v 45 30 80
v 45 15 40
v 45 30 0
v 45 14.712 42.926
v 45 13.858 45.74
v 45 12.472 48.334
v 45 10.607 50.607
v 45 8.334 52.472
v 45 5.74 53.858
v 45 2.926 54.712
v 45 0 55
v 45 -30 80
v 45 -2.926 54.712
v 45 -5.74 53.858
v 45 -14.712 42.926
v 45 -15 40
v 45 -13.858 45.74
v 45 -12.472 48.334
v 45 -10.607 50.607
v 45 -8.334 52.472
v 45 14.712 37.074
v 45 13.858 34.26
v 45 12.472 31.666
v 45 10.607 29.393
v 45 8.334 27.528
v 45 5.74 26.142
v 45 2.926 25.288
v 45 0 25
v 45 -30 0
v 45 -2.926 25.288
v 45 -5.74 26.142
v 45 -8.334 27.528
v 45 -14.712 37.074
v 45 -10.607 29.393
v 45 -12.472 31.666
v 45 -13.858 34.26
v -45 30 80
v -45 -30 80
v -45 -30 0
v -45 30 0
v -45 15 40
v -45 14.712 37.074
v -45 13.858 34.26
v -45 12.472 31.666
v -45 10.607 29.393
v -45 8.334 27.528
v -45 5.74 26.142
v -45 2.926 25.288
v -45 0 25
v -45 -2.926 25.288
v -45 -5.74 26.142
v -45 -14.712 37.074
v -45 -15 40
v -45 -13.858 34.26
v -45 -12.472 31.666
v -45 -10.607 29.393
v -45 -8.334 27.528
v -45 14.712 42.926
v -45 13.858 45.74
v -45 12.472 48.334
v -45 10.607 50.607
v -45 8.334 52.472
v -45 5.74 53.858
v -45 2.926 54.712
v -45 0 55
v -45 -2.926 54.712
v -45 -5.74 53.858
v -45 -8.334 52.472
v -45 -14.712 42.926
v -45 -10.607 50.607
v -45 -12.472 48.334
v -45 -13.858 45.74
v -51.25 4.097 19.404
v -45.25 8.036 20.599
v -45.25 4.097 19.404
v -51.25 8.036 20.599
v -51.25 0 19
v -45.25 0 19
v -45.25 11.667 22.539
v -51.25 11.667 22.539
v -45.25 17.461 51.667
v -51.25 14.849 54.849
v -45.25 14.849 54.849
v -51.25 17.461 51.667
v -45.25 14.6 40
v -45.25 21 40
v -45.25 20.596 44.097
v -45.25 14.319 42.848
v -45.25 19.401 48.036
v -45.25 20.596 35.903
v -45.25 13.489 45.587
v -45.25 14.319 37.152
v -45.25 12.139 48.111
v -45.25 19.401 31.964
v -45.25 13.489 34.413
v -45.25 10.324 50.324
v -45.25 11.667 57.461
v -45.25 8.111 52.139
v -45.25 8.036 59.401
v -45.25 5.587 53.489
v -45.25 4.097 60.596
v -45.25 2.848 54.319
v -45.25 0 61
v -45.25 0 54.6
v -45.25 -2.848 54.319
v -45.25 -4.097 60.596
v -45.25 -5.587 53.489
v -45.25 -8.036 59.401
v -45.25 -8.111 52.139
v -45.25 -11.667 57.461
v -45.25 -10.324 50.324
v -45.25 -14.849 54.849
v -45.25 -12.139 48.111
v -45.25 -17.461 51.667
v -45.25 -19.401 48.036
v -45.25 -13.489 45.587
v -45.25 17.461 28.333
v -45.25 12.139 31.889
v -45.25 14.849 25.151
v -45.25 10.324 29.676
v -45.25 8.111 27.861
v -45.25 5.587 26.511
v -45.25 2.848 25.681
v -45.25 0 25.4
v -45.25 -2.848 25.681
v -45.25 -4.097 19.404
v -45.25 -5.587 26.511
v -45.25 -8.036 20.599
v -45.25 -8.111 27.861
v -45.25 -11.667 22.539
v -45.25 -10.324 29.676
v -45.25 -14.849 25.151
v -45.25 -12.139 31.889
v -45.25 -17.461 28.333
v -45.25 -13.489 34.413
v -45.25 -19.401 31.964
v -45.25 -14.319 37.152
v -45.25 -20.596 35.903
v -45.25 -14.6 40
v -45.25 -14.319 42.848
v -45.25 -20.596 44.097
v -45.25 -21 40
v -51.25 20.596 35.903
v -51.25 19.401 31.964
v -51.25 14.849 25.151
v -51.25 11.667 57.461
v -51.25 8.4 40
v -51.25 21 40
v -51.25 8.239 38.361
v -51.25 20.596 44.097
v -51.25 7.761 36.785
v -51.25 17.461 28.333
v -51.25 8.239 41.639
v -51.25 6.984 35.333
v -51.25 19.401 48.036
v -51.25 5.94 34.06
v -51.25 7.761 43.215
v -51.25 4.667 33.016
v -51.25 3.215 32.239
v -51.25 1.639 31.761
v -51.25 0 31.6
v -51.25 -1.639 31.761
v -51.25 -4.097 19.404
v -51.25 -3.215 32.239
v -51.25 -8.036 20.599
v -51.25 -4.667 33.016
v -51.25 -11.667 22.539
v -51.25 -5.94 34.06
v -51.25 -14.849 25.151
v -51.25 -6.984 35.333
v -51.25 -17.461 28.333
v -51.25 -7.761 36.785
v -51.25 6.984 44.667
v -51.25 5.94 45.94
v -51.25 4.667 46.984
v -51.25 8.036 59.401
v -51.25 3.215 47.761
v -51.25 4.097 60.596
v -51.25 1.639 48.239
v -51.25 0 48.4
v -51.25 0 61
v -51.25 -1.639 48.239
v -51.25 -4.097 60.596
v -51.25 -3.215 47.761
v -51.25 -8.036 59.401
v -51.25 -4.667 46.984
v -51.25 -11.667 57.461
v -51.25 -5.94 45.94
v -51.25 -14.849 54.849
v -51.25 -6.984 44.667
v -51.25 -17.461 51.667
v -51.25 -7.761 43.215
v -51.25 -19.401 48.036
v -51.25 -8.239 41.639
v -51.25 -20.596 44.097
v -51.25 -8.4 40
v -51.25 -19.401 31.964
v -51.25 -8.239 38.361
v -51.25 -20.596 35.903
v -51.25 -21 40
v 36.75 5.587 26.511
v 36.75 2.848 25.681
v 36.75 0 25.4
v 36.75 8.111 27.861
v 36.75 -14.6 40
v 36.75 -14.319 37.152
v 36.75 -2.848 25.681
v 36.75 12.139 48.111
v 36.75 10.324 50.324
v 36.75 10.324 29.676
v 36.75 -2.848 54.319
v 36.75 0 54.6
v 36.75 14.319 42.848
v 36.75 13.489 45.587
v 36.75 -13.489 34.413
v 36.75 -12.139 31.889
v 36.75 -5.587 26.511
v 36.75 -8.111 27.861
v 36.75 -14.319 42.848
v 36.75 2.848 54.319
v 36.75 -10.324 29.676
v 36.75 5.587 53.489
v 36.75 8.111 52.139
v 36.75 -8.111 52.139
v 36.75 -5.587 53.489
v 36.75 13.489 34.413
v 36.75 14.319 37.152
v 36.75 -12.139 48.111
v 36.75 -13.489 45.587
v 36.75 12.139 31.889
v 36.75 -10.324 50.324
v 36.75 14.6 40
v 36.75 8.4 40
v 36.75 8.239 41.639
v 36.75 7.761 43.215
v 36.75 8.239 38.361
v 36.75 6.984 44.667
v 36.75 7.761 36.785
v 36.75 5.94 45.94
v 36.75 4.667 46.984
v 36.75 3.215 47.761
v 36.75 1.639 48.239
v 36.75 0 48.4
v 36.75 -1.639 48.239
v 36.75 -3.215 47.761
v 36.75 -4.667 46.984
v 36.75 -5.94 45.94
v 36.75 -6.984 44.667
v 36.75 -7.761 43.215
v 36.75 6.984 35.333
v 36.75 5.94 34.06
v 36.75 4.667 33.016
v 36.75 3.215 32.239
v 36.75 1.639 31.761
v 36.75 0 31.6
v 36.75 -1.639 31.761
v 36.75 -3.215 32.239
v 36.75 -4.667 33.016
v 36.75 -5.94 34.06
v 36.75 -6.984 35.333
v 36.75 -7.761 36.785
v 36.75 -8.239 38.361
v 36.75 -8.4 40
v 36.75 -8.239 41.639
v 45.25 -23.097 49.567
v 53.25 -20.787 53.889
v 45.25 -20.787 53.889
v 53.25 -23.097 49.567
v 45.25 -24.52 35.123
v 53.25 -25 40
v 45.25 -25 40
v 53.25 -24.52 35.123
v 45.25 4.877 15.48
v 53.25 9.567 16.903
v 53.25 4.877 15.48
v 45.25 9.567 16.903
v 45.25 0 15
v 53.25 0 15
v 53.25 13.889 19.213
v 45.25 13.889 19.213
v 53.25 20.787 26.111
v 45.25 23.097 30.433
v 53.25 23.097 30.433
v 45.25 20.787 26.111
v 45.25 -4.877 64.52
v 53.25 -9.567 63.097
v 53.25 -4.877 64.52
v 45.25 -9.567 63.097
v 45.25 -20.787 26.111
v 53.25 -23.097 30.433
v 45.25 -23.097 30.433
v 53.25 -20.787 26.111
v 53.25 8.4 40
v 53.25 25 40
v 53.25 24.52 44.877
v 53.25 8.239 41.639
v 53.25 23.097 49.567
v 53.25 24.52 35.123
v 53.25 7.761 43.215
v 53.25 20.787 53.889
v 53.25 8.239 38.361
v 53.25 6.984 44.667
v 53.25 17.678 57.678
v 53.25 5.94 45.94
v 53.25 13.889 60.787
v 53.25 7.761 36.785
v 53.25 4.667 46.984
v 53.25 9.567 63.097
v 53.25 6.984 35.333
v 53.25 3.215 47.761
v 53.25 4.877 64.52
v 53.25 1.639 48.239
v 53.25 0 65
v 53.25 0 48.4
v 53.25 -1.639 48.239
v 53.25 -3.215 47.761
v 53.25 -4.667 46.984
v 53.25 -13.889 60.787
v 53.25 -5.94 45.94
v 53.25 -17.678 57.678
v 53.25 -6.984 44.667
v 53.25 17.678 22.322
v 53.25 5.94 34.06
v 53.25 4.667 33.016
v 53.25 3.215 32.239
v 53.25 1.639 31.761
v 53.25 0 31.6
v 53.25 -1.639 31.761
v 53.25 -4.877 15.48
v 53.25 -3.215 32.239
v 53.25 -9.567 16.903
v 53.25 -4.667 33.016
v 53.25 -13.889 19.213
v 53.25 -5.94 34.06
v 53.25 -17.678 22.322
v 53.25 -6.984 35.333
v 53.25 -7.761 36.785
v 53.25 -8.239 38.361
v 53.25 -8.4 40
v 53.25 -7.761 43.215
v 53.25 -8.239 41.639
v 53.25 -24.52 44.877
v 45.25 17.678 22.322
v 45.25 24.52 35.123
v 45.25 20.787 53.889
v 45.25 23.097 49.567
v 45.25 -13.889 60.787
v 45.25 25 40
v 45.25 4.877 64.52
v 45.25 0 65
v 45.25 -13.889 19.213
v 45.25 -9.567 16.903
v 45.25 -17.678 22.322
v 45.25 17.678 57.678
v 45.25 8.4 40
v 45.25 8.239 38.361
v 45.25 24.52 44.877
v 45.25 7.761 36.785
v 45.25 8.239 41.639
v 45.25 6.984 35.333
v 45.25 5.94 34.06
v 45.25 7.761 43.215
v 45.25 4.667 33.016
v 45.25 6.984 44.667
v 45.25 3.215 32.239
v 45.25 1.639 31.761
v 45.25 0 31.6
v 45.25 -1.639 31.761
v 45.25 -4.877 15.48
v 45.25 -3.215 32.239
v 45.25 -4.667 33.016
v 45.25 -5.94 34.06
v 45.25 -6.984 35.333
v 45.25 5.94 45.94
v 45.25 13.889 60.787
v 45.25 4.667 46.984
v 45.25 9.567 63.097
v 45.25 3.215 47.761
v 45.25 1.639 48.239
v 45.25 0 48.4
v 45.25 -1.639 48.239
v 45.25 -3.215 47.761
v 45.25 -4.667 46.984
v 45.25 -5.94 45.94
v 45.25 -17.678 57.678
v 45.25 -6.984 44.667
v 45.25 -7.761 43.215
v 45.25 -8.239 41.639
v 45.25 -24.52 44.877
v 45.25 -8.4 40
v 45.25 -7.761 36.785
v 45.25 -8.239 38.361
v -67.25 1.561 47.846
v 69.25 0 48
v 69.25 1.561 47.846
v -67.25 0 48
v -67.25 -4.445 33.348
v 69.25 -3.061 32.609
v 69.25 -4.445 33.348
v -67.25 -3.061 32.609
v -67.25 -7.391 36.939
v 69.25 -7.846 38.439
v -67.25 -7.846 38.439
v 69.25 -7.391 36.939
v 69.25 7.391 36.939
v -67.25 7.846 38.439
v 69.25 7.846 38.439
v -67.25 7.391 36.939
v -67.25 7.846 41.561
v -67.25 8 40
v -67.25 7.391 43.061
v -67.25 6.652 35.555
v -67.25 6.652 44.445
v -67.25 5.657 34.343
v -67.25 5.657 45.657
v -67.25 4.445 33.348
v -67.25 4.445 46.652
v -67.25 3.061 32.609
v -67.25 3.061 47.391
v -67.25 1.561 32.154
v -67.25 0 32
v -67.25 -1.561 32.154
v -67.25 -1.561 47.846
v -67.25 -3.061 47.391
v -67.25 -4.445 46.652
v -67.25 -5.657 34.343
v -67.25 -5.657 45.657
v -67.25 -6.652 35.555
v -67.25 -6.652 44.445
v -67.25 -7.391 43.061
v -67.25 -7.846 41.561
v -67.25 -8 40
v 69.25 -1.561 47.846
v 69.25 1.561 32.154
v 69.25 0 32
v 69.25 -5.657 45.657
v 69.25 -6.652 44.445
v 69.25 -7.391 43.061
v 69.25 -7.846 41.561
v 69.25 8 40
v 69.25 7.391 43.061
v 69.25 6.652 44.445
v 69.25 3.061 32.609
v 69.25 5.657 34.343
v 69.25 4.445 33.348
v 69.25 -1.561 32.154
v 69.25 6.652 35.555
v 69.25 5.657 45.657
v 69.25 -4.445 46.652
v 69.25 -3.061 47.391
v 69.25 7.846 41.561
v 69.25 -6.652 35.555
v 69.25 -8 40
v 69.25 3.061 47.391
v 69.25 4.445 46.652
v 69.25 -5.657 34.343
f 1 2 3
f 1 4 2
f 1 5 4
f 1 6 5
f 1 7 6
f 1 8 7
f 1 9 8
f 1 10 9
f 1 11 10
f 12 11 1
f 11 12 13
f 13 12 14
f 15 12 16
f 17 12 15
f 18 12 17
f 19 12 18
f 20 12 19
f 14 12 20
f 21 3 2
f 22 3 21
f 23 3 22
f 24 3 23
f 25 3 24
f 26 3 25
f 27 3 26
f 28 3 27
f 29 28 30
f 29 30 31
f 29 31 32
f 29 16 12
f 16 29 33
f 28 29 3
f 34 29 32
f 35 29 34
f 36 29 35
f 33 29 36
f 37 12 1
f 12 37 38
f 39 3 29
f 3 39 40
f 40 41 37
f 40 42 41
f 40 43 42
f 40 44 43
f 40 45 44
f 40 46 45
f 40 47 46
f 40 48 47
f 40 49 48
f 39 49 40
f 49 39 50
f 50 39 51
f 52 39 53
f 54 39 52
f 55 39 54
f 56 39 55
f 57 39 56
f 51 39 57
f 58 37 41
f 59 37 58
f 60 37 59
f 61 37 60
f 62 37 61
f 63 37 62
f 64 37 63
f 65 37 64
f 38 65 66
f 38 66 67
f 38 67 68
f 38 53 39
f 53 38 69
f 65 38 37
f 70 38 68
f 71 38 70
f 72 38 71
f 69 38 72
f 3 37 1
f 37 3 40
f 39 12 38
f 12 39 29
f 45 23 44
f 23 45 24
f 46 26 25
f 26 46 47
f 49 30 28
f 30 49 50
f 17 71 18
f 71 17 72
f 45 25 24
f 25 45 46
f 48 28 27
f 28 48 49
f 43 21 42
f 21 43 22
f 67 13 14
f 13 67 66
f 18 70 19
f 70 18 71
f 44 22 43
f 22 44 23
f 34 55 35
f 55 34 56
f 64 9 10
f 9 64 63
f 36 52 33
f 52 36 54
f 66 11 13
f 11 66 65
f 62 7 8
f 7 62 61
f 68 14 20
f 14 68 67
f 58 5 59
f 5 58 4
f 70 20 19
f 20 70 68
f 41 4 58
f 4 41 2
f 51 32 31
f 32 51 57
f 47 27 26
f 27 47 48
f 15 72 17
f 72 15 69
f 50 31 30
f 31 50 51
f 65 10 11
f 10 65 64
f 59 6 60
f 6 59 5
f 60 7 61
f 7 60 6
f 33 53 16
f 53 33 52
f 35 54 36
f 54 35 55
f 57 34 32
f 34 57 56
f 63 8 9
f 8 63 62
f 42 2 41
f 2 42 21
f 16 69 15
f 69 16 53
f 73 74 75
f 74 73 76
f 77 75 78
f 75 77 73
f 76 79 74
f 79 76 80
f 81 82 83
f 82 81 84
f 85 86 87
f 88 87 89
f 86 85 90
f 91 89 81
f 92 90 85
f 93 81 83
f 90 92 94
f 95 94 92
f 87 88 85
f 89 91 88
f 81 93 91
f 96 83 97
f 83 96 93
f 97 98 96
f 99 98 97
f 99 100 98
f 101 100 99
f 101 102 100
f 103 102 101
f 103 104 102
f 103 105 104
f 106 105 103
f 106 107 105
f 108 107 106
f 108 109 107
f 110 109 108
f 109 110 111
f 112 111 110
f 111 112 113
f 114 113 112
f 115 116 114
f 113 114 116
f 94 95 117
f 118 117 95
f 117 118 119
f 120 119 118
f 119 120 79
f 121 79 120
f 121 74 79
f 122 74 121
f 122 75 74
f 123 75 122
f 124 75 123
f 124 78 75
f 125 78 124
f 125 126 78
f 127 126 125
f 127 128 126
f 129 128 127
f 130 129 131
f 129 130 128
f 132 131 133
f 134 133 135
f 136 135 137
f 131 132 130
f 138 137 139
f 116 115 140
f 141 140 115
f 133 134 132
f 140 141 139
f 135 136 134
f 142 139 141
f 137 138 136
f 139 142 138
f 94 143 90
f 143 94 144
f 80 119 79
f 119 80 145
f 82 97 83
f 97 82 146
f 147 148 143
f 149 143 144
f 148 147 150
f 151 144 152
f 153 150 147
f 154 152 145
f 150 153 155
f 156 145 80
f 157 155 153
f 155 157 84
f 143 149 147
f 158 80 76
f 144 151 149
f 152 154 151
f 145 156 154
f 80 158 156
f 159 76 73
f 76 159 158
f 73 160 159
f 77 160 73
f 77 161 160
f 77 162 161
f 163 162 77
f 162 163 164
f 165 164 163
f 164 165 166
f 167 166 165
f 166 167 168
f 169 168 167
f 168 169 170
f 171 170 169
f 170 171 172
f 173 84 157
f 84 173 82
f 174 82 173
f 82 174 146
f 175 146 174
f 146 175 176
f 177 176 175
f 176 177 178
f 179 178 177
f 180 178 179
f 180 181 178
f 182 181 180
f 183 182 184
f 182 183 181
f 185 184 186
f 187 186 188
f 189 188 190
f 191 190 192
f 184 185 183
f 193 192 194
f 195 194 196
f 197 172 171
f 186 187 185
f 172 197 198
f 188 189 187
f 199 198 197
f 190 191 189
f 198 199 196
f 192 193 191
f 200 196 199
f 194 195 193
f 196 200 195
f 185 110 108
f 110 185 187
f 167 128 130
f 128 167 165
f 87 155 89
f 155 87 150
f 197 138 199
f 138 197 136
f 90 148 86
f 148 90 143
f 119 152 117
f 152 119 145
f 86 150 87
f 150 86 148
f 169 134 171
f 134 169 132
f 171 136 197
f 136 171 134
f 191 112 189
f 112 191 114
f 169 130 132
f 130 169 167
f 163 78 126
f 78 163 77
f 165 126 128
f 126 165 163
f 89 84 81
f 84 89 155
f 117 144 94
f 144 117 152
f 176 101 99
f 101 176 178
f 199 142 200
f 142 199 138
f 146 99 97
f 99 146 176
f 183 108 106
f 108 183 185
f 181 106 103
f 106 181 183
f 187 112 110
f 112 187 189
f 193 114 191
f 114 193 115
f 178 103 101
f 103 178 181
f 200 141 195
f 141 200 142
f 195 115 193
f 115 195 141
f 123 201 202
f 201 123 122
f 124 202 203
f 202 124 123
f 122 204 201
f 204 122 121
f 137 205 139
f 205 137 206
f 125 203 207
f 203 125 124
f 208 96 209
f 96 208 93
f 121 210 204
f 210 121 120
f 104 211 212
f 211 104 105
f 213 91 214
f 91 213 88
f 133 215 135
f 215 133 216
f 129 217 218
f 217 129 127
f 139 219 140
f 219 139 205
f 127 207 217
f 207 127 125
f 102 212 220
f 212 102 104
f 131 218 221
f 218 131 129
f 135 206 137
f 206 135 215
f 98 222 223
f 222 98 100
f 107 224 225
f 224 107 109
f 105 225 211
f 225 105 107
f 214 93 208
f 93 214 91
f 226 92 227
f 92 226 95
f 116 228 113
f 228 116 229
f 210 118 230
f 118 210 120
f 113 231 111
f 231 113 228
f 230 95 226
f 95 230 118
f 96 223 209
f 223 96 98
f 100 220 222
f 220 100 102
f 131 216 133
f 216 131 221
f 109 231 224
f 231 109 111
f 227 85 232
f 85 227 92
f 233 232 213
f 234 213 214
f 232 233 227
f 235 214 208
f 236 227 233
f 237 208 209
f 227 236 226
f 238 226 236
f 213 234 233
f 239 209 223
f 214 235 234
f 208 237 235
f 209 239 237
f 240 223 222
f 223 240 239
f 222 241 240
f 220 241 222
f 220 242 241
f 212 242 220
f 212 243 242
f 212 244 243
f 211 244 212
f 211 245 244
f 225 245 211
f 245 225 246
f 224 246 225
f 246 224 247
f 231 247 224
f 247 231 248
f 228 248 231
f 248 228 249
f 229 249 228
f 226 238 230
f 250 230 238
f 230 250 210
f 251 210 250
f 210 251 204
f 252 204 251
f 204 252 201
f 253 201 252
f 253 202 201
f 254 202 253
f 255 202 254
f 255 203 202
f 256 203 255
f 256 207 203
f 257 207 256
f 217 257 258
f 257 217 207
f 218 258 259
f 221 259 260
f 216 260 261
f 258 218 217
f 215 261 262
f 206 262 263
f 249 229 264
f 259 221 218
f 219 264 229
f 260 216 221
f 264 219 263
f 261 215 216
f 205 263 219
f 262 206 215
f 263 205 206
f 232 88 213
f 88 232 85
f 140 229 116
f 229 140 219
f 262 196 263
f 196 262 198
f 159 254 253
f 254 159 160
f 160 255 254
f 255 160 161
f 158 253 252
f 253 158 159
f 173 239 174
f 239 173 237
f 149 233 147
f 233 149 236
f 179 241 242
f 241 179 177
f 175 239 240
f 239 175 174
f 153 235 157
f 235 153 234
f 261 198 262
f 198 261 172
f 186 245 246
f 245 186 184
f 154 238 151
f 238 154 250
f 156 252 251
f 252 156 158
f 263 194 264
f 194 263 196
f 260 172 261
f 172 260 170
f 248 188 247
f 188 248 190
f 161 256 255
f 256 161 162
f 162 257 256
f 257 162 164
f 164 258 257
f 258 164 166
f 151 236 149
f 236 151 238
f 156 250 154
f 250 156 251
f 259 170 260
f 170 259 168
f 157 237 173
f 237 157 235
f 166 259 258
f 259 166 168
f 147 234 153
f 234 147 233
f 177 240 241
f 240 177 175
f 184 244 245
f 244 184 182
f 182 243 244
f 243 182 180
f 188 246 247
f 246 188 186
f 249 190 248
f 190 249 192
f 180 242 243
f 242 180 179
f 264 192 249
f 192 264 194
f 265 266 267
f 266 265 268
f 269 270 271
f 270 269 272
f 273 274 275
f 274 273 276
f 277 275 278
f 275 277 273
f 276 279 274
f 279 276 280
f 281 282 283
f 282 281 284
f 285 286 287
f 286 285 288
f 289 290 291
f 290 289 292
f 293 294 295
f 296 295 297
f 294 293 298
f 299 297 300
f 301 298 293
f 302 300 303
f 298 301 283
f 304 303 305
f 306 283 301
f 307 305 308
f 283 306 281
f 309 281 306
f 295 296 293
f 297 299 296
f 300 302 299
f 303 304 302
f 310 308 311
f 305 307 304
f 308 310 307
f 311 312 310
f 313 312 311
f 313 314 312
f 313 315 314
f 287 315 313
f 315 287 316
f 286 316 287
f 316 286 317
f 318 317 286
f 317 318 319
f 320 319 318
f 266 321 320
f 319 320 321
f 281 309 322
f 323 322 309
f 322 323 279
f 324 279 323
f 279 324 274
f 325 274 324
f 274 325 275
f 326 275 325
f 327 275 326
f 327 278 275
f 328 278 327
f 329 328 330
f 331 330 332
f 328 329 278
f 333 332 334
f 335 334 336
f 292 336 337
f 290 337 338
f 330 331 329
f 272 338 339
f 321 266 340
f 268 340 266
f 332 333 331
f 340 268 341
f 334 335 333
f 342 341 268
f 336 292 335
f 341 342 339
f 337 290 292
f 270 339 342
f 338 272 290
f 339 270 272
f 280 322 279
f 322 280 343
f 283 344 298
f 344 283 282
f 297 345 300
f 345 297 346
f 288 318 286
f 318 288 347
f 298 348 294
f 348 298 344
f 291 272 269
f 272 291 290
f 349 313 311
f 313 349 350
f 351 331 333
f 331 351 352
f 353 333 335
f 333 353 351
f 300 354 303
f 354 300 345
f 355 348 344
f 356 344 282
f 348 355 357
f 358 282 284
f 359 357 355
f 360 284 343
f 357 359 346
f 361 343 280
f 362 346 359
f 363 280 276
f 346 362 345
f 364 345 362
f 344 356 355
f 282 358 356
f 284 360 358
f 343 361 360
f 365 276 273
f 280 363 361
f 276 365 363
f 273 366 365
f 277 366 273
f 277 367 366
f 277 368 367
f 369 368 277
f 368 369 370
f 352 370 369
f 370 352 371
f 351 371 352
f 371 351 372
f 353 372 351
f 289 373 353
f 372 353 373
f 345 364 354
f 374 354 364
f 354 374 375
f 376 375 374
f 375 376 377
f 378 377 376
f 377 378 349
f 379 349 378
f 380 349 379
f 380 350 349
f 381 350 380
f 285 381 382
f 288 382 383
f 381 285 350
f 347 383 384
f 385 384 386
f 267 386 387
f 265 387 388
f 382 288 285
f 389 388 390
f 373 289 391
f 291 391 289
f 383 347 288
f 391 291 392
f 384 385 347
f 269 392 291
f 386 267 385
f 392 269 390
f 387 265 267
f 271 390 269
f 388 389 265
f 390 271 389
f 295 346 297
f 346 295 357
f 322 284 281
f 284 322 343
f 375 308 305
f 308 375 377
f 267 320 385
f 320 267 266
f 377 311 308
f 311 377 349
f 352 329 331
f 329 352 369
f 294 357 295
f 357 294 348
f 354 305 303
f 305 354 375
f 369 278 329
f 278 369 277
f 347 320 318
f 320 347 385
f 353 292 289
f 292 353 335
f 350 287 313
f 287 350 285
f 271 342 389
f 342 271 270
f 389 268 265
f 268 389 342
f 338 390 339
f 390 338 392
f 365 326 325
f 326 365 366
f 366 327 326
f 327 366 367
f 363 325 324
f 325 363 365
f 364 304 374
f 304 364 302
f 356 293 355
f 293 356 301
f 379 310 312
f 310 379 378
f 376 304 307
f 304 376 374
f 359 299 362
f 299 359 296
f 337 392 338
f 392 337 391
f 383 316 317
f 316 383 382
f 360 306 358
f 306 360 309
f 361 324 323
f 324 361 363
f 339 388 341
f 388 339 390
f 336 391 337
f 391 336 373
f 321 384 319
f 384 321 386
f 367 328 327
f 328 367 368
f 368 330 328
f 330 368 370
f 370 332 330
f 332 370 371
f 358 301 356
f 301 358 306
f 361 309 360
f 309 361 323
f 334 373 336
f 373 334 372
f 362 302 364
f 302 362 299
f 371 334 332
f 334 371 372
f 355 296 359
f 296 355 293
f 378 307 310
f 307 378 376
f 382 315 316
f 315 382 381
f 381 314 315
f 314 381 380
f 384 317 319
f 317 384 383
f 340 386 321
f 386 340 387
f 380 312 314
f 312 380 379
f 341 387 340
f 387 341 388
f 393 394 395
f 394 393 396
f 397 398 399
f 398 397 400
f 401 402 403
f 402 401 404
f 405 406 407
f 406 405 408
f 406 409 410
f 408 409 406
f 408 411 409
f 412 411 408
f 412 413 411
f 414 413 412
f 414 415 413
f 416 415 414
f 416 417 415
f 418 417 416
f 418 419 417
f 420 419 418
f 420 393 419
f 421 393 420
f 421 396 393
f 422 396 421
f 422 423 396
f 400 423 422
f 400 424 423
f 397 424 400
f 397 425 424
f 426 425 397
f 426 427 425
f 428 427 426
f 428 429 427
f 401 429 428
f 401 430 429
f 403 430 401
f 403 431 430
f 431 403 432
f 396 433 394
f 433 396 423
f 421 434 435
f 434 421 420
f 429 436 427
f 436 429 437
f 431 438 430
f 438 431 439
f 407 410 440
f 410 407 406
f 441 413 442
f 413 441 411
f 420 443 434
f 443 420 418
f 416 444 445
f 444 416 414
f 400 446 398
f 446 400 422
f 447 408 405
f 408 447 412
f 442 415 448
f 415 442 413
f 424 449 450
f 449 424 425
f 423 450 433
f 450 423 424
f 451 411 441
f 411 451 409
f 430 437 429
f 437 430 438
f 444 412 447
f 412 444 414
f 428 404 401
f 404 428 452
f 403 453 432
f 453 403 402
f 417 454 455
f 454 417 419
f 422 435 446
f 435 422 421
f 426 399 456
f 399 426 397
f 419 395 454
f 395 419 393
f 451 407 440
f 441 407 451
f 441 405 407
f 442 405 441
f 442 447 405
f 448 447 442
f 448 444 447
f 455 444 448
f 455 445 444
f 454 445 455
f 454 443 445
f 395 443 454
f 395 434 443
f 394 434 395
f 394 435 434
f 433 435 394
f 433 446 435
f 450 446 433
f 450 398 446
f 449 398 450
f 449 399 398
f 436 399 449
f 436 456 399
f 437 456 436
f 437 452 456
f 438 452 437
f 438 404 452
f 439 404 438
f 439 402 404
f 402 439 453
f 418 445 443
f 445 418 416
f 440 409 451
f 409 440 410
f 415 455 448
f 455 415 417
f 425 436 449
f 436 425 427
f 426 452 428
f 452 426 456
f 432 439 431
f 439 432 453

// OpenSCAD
$fn = 32;

// ------------------------------------------------------------------------
// Bushed housing: 90 x 60 x 80 mm housing, bushing d29.2
// Every part is its own module, assembly() places them once.
// ------------------------------------------------------------------------

// --- part 1 ---
module housing() {
  difference() {
    translate([-45, -30, 0]) cube([90, 60, 80]);
    translate([0, 0, 40]) rotate([0, 90, 0]) cylinder(h = 92, d = 30, center = true);
  }
}

// --- part 2 ---
module bushing() {
  difference() {
    union() {
      cylinder(h = 6, d = 42);
      translate([0, 0, 6]) cylinder(h = 82, d = 29.2);
    }
    translate([0, 0, -1]) cylinder(h = 90, d = 16.8);
  }
}

// --- part 3 ---
module shaft() {
  translate([0, 0, -68.25]) cylinder(h = 136.5, d = 16);
}

// --- part 4 ---
module cover() {
  difference() {
    cylinder(h = 8, d = 50);
    translate([0, 0, -1]) cylinder(h = 10, d = 16.8);
  }
}

// --- assembly ---
module assembly() {
  translate([0, 0, 0]) rotate([0, 0, 0]) housing();
  translate([-51.25, 0, 40]) rotate([0, 90, 0]) bushing();
  translate([1, 0, 40]) rotate([0, 90, 0]) shaft();
  translate([45.25, 0, 40]) rotate([0, 90, 0]) cover();
}

assembly();
